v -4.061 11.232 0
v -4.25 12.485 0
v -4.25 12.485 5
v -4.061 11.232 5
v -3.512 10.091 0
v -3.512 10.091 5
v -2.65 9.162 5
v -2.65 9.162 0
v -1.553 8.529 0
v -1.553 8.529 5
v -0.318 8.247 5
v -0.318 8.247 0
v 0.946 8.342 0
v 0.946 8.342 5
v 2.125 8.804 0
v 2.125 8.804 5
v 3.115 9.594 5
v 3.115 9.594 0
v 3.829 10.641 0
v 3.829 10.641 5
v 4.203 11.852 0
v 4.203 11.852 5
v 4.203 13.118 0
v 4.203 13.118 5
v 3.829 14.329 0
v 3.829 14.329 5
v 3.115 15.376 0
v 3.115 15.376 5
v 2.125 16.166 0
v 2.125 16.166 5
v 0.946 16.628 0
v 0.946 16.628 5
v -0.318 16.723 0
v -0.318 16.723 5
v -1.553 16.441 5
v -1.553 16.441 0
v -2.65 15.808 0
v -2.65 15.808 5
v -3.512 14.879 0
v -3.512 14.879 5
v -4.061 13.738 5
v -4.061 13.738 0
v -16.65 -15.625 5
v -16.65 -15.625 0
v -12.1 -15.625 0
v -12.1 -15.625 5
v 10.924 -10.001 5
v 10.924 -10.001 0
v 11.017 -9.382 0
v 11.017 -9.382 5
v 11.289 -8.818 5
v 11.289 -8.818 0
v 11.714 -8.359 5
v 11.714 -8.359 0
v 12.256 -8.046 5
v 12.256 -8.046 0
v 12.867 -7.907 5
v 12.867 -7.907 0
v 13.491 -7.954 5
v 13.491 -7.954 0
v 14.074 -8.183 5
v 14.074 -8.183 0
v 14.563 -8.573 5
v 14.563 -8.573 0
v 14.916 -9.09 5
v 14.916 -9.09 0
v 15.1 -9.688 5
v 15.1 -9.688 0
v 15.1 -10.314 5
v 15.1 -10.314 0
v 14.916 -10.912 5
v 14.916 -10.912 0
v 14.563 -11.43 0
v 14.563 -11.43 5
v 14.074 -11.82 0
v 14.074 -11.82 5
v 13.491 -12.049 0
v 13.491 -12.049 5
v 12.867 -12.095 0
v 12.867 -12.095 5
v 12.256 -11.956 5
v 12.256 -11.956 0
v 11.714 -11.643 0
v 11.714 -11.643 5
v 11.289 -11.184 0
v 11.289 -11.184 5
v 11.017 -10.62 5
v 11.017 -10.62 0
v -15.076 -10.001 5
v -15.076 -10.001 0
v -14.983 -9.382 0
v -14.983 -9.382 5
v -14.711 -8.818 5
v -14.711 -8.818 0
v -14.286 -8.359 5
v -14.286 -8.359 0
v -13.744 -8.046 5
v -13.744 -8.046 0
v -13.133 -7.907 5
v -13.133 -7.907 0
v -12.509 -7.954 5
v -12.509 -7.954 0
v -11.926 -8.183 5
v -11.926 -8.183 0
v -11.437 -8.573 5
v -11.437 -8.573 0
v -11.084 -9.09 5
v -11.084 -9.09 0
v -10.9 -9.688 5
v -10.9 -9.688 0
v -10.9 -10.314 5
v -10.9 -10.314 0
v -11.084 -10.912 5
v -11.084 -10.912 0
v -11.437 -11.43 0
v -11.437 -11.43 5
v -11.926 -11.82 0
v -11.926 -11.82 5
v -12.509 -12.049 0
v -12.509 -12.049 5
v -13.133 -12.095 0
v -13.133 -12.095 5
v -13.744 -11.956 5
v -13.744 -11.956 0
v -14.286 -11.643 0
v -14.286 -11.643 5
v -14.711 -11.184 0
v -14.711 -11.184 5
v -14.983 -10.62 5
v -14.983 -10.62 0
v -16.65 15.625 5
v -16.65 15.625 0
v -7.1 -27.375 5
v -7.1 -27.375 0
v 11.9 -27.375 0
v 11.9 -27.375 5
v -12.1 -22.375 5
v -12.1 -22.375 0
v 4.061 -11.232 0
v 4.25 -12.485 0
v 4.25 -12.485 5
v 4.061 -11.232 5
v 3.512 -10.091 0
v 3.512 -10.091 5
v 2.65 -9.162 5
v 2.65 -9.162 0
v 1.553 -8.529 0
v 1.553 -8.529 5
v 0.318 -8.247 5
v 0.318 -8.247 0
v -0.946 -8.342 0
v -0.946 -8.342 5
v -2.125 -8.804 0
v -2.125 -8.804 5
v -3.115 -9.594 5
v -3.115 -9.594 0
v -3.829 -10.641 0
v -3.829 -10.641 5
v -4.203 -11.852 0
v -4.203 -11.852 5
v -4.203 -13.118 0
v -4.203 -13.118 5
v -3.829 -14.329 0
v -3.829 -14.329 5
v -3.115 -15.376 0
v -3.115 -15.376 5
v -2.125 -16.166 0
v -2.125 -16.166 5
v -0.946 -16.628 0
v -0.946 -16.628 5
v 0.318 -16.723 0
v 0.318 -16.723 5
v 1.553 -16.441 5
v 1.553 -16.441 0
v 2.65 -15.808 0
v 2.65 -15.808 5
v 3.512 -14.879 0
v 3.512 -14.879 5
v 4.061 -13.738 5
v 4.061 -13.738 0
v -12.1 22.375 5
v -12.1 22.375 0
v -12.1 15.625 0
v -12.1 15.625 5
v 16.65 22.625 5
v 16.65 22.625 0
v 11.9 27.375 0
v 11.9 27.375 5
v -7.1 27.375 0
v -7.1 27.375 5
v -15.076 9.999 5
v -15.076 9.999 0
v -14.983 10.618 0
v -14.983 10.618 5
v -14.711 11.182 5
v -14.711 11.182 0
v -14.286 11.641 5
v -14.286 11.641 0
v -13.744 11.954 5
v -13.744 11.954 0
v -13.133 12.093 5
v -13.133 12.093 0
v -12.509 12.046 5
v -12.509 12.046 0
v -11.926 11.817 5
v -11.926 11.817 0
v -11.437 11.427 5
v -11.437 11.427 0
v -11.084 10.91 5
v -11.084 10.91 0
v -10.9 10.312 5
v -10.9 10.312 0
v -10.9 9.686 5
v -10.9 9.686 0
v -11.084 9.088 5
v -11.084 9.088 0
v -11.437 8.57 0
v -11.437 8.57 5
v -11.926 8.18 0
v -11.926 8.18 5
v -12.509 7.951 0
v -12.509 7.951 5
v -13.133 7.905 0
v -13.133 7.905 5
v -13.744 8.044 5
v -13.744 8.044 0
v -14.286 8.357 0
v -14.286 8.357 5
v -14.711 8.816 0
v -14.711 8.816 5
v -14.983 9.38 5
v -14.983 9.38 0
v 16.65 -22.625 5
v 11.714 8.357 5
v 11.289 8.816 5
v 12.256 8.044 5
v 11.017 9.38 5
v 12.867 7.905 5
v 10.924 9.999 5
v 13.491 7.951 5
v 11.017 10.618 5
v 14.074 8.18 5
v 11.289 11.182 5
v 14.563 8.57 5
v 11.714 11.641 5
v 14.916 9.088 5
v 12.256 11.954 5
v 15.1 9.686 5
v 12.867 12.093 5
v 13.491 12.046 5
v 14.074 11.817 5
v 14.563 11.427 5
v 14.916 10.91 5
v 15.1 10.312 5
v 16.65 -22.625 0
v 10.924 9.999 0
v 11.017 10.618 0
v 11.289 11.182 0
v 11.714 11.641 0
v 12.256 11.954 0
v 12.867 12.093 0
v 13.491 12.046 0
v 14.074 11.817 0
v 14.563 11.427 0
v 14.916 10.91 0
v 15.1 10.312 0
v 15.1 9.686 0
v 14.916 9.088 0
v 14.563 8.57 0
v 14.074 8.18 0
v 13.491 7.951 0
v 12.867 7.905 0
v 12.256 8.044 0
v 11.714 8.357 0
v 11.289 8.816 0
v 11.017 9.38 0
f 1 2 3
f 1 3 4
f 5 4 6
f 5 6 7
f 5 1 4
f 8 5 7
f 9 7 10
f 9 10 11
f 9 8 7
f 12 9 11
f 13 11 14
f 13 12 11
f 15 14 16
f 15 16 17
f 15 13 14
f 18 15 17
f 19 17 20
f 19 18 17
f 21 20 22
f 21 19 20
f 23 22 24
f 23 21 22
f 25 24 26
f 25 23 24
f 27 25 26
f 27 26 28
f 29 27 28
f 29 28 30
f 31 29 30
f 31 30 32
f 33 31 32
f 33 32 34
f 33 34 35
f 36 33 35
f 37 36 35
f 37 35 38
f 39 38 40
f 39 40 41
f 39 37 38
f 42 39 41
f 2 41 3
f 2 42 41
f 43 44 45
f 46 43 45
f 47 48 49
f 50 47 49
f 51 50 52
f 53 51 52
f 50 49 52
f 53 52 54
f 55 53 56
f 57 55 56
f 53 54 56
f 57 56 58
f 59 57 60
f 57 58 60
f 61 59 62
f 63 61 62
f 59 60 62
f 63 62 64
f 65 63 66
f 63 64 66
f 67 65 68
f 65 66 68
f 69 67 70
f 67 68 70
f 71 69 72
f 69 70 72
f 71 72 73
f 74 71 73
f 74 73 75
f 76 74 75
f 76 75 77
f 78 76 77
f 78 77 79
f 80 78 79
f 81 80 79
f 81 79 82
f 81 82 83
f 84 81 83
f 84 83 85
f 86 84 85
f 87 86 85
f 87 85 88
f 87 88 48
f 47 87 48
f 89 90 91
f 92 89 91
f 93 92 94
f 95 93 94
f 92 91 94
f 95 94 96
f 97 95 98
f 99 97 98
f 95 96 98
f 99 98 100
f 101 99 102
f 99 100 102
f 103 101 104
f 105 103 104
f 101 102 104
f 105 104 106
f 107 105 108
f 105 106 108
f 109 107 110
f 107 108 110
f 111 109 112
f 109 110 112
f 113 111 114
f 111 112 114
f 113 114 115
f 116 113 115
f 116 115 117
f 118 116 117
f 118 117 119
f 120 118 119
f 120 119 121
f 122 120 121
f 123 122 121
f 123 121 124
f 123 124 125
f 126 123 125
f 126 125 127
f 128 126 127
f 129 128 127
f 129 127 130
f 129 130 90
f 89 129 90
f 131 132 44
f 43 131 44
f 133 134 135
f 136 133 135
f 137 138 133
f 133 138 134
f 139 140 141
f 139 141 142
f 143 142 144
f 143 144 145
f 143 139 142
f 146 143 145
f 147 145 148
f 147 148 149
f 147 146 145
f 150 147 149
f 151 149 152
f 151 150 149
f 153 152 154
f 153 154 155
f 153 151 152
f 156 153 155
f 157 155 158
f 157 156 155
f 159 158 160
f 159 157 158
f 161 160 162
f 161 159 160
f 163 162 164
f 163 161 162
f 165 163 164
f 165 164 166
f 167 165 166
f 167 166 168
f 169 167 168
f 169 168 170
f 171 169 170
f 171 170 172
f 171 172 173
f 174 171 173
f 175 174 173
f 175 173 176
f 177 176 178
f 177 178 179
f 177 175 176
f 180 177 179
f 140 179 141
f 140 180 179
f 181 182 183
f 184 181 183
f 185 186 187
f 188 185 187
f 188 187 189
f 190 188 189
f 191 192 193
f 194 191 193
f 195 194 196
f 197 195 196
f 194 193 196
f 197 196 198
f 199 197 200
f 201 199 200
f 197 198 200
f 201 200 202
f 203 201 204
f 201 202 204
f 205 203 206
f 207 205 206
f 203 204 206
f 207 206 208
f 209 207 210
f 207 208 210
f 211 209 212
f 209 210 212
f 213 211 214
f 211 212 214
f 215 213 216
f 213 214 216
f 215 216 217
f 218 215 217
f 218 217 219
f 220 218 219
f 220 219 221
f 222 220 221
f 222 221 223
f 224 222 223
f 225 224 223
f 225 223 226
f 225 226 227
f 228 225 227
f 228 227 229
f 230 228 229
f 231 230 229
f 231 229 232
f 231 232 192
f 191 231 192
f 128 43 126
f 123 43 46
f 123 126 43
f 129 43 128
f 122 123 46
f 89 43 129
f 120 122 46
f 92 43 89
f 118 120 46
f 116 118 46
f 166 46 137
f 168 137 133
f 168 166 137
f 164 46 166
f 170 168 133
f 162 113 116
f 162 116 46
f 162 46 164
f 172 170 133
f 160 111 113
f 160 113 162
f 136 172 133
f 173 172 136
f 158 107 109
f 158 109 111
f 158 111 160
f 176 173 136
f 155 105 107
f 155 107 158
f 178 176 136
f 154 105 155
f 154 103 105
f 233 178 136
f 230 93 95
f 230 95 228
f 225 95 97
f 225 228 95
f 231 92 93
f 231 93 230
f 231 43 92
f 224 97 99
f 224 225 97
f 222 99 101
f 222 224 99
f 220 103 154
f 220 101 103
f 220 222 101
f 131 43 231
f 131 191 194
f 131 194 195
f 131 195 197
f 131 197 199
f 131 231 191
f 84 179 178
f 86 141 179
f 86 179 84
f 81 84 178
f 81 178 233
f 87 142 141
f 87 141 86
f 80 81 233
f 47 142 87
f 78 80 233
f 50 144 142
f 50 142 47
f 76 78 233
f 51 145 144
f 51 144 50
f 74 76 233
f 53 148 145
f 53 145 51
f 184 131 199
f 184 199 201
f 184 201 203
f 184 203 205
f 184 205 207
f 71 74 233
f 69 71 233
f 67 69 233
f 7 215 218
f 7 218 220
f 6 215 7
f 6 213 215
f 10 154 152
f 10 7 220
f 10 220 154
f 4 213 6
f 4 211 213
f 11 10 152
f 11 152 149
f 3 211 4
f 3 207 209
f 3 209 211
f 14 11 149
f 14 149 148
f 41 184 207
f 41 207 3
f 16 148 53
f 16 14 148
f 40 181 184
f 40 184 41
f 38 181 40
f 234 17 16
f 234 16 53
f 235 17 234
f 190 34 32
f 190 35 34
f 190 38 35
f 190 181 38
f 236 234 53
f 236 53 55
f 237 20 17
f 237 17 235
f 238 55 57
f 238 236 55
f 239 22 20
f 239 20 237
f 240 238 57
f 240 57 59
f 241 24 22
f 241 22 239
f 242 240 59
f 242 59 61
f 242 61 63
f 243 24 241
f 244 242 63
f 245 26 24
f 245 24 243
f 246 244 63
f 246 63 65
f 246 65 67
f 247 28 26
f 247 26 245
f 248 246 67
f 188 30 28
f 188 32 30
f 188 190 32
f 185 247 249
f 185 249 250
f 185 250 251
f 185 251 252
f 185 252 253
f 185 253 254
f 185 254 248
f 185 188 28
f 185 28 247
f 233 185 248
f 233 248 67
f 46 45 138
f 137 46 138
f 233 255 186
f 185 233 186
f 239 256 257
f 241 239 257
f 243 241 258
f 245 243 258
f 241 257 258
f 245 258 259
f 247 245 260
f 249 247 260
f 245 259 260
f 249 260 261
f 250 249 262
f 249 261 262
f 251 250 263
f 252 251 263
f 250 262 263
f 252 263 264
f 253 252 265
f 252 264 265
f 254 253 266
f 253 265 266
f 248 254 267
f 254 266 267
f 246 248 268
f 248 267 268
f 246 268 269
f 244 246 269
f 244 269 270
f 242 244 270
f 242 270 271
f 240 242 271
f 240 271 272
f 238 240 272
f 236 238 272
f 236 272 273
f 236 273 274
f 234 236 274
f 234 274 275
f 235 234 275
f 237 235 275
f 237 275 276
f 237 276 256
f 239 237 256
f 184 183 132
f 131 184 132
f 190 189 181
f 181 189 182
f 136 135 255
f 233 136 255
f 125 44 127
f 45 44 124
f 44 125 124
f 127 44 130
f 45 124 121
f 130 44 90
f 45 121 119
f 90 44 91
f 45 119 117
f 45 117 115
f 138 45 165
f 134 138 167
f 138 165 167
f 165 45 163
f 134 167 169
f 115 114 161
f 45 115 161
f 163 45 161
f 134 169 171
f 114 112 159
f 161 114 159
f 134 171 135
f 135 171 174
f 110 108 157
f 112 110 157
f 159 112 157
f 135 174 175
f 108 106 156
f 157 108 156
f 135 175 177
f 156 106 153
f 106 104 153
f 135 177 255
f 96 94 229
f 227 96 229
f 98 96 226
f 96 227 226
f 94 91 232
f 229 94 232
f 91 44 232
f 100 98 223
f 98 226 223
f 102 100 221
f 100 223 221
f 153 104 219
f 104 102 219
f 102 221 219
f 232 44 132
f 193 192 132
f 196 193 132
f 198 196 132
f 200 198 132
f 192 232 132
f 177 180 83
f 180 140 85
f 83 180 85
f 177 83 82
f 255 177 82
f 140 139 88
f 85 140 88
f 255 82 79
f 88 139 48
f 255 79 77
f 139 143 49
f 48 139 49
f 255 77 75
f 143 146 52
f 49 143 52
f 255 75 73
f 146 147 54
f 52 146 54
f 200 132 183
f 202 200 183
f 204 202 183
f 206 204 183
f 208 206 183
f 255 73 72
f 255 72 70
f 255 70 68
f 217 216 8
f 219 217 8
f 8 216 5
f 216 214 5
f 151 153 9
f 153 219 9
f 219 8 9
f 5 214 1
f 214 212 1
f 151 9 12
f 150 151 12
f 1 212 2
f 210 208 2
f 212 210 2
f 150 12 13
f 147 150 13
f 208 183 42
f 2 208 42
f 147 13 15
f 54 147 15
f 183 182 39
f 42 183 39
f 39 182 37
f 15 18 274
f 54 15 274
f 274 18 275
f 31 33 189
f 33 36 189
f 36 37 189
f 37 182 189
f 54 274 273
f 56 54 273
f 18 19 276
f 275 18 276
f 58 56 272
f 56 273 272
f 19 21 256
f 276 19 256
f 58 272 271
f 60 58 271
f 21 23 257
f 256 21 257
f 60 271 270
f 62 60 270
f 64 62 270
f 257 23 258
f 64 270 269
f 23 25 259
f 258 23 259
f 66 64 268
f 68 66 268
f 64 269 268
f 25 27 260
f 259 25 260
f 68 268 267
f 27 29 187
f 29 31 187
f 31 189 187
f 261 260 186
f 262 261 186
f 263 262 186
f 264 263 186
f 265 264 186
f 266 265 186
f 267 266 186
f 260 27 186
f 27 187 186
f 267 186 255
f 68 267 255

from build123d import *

# Parameters (mm, degrees)
SKETCH1_R           = 4.25
BOSS_EXTRUDE1_DEPTH = 5
SKETCH2_R           = 2.1
CUT_EXTRUDE1_DEPTH  = 10


with BuildPart() as part:
    # Sketch1 → Boss-Extrude1 (new body)
    with BuildSketch(Plane.XY):
        Polygon((11.900055679, -27.375), (16.650055679, -22.625), (16.650055679, 22.625), (11.900055679, 27.375), (-7.099944321, 27.375), (-12.099944321, 22.375), (-12.099944321, 15.625), (-16.65, 15.625), (-16.65, -15.625), (-12.099944321, -15.625), (-12.099944321, -22.375), (-7.099944321, -27.375), align=None)
        with Locations((0, -12.485)):
            Circle(SKETCH1_R, mode=Mode.SUBTRACT)
        with Locations(Location((0, 12.485, 0), (0, 0, 180))):
            Circle(SKETCH1_R, mode=Mode.SUBTRACT)
    extrude(amount=BOSS_EXTRUDE1_DEPTH)

    # Sketch2 → Cut-Extrude1 (cut)
    with BuildSketch(Plane(origin=(0, 0, 0), x_dir=(-1, 0, 0), z_dir=(0, 0, -1))):
        with Locations((-13.023685007, -10.001298691)):
            Circle(SKETCH2_R)
        with Locations((-13.023685007, 9.998690221)):
            Circle(SKETCH2_R)
        with Locations((12.976300579, -10.001298691)):
            Circle(SKETCH2_R)
        with Locations((12.976300579, 9.998690221)):
            Circle(SKETCH2_R)
    extrude(amount=-CUT_EXTRUDE1_DEPTH, mode=Mode.SUBTRACT)


solid = part.part
